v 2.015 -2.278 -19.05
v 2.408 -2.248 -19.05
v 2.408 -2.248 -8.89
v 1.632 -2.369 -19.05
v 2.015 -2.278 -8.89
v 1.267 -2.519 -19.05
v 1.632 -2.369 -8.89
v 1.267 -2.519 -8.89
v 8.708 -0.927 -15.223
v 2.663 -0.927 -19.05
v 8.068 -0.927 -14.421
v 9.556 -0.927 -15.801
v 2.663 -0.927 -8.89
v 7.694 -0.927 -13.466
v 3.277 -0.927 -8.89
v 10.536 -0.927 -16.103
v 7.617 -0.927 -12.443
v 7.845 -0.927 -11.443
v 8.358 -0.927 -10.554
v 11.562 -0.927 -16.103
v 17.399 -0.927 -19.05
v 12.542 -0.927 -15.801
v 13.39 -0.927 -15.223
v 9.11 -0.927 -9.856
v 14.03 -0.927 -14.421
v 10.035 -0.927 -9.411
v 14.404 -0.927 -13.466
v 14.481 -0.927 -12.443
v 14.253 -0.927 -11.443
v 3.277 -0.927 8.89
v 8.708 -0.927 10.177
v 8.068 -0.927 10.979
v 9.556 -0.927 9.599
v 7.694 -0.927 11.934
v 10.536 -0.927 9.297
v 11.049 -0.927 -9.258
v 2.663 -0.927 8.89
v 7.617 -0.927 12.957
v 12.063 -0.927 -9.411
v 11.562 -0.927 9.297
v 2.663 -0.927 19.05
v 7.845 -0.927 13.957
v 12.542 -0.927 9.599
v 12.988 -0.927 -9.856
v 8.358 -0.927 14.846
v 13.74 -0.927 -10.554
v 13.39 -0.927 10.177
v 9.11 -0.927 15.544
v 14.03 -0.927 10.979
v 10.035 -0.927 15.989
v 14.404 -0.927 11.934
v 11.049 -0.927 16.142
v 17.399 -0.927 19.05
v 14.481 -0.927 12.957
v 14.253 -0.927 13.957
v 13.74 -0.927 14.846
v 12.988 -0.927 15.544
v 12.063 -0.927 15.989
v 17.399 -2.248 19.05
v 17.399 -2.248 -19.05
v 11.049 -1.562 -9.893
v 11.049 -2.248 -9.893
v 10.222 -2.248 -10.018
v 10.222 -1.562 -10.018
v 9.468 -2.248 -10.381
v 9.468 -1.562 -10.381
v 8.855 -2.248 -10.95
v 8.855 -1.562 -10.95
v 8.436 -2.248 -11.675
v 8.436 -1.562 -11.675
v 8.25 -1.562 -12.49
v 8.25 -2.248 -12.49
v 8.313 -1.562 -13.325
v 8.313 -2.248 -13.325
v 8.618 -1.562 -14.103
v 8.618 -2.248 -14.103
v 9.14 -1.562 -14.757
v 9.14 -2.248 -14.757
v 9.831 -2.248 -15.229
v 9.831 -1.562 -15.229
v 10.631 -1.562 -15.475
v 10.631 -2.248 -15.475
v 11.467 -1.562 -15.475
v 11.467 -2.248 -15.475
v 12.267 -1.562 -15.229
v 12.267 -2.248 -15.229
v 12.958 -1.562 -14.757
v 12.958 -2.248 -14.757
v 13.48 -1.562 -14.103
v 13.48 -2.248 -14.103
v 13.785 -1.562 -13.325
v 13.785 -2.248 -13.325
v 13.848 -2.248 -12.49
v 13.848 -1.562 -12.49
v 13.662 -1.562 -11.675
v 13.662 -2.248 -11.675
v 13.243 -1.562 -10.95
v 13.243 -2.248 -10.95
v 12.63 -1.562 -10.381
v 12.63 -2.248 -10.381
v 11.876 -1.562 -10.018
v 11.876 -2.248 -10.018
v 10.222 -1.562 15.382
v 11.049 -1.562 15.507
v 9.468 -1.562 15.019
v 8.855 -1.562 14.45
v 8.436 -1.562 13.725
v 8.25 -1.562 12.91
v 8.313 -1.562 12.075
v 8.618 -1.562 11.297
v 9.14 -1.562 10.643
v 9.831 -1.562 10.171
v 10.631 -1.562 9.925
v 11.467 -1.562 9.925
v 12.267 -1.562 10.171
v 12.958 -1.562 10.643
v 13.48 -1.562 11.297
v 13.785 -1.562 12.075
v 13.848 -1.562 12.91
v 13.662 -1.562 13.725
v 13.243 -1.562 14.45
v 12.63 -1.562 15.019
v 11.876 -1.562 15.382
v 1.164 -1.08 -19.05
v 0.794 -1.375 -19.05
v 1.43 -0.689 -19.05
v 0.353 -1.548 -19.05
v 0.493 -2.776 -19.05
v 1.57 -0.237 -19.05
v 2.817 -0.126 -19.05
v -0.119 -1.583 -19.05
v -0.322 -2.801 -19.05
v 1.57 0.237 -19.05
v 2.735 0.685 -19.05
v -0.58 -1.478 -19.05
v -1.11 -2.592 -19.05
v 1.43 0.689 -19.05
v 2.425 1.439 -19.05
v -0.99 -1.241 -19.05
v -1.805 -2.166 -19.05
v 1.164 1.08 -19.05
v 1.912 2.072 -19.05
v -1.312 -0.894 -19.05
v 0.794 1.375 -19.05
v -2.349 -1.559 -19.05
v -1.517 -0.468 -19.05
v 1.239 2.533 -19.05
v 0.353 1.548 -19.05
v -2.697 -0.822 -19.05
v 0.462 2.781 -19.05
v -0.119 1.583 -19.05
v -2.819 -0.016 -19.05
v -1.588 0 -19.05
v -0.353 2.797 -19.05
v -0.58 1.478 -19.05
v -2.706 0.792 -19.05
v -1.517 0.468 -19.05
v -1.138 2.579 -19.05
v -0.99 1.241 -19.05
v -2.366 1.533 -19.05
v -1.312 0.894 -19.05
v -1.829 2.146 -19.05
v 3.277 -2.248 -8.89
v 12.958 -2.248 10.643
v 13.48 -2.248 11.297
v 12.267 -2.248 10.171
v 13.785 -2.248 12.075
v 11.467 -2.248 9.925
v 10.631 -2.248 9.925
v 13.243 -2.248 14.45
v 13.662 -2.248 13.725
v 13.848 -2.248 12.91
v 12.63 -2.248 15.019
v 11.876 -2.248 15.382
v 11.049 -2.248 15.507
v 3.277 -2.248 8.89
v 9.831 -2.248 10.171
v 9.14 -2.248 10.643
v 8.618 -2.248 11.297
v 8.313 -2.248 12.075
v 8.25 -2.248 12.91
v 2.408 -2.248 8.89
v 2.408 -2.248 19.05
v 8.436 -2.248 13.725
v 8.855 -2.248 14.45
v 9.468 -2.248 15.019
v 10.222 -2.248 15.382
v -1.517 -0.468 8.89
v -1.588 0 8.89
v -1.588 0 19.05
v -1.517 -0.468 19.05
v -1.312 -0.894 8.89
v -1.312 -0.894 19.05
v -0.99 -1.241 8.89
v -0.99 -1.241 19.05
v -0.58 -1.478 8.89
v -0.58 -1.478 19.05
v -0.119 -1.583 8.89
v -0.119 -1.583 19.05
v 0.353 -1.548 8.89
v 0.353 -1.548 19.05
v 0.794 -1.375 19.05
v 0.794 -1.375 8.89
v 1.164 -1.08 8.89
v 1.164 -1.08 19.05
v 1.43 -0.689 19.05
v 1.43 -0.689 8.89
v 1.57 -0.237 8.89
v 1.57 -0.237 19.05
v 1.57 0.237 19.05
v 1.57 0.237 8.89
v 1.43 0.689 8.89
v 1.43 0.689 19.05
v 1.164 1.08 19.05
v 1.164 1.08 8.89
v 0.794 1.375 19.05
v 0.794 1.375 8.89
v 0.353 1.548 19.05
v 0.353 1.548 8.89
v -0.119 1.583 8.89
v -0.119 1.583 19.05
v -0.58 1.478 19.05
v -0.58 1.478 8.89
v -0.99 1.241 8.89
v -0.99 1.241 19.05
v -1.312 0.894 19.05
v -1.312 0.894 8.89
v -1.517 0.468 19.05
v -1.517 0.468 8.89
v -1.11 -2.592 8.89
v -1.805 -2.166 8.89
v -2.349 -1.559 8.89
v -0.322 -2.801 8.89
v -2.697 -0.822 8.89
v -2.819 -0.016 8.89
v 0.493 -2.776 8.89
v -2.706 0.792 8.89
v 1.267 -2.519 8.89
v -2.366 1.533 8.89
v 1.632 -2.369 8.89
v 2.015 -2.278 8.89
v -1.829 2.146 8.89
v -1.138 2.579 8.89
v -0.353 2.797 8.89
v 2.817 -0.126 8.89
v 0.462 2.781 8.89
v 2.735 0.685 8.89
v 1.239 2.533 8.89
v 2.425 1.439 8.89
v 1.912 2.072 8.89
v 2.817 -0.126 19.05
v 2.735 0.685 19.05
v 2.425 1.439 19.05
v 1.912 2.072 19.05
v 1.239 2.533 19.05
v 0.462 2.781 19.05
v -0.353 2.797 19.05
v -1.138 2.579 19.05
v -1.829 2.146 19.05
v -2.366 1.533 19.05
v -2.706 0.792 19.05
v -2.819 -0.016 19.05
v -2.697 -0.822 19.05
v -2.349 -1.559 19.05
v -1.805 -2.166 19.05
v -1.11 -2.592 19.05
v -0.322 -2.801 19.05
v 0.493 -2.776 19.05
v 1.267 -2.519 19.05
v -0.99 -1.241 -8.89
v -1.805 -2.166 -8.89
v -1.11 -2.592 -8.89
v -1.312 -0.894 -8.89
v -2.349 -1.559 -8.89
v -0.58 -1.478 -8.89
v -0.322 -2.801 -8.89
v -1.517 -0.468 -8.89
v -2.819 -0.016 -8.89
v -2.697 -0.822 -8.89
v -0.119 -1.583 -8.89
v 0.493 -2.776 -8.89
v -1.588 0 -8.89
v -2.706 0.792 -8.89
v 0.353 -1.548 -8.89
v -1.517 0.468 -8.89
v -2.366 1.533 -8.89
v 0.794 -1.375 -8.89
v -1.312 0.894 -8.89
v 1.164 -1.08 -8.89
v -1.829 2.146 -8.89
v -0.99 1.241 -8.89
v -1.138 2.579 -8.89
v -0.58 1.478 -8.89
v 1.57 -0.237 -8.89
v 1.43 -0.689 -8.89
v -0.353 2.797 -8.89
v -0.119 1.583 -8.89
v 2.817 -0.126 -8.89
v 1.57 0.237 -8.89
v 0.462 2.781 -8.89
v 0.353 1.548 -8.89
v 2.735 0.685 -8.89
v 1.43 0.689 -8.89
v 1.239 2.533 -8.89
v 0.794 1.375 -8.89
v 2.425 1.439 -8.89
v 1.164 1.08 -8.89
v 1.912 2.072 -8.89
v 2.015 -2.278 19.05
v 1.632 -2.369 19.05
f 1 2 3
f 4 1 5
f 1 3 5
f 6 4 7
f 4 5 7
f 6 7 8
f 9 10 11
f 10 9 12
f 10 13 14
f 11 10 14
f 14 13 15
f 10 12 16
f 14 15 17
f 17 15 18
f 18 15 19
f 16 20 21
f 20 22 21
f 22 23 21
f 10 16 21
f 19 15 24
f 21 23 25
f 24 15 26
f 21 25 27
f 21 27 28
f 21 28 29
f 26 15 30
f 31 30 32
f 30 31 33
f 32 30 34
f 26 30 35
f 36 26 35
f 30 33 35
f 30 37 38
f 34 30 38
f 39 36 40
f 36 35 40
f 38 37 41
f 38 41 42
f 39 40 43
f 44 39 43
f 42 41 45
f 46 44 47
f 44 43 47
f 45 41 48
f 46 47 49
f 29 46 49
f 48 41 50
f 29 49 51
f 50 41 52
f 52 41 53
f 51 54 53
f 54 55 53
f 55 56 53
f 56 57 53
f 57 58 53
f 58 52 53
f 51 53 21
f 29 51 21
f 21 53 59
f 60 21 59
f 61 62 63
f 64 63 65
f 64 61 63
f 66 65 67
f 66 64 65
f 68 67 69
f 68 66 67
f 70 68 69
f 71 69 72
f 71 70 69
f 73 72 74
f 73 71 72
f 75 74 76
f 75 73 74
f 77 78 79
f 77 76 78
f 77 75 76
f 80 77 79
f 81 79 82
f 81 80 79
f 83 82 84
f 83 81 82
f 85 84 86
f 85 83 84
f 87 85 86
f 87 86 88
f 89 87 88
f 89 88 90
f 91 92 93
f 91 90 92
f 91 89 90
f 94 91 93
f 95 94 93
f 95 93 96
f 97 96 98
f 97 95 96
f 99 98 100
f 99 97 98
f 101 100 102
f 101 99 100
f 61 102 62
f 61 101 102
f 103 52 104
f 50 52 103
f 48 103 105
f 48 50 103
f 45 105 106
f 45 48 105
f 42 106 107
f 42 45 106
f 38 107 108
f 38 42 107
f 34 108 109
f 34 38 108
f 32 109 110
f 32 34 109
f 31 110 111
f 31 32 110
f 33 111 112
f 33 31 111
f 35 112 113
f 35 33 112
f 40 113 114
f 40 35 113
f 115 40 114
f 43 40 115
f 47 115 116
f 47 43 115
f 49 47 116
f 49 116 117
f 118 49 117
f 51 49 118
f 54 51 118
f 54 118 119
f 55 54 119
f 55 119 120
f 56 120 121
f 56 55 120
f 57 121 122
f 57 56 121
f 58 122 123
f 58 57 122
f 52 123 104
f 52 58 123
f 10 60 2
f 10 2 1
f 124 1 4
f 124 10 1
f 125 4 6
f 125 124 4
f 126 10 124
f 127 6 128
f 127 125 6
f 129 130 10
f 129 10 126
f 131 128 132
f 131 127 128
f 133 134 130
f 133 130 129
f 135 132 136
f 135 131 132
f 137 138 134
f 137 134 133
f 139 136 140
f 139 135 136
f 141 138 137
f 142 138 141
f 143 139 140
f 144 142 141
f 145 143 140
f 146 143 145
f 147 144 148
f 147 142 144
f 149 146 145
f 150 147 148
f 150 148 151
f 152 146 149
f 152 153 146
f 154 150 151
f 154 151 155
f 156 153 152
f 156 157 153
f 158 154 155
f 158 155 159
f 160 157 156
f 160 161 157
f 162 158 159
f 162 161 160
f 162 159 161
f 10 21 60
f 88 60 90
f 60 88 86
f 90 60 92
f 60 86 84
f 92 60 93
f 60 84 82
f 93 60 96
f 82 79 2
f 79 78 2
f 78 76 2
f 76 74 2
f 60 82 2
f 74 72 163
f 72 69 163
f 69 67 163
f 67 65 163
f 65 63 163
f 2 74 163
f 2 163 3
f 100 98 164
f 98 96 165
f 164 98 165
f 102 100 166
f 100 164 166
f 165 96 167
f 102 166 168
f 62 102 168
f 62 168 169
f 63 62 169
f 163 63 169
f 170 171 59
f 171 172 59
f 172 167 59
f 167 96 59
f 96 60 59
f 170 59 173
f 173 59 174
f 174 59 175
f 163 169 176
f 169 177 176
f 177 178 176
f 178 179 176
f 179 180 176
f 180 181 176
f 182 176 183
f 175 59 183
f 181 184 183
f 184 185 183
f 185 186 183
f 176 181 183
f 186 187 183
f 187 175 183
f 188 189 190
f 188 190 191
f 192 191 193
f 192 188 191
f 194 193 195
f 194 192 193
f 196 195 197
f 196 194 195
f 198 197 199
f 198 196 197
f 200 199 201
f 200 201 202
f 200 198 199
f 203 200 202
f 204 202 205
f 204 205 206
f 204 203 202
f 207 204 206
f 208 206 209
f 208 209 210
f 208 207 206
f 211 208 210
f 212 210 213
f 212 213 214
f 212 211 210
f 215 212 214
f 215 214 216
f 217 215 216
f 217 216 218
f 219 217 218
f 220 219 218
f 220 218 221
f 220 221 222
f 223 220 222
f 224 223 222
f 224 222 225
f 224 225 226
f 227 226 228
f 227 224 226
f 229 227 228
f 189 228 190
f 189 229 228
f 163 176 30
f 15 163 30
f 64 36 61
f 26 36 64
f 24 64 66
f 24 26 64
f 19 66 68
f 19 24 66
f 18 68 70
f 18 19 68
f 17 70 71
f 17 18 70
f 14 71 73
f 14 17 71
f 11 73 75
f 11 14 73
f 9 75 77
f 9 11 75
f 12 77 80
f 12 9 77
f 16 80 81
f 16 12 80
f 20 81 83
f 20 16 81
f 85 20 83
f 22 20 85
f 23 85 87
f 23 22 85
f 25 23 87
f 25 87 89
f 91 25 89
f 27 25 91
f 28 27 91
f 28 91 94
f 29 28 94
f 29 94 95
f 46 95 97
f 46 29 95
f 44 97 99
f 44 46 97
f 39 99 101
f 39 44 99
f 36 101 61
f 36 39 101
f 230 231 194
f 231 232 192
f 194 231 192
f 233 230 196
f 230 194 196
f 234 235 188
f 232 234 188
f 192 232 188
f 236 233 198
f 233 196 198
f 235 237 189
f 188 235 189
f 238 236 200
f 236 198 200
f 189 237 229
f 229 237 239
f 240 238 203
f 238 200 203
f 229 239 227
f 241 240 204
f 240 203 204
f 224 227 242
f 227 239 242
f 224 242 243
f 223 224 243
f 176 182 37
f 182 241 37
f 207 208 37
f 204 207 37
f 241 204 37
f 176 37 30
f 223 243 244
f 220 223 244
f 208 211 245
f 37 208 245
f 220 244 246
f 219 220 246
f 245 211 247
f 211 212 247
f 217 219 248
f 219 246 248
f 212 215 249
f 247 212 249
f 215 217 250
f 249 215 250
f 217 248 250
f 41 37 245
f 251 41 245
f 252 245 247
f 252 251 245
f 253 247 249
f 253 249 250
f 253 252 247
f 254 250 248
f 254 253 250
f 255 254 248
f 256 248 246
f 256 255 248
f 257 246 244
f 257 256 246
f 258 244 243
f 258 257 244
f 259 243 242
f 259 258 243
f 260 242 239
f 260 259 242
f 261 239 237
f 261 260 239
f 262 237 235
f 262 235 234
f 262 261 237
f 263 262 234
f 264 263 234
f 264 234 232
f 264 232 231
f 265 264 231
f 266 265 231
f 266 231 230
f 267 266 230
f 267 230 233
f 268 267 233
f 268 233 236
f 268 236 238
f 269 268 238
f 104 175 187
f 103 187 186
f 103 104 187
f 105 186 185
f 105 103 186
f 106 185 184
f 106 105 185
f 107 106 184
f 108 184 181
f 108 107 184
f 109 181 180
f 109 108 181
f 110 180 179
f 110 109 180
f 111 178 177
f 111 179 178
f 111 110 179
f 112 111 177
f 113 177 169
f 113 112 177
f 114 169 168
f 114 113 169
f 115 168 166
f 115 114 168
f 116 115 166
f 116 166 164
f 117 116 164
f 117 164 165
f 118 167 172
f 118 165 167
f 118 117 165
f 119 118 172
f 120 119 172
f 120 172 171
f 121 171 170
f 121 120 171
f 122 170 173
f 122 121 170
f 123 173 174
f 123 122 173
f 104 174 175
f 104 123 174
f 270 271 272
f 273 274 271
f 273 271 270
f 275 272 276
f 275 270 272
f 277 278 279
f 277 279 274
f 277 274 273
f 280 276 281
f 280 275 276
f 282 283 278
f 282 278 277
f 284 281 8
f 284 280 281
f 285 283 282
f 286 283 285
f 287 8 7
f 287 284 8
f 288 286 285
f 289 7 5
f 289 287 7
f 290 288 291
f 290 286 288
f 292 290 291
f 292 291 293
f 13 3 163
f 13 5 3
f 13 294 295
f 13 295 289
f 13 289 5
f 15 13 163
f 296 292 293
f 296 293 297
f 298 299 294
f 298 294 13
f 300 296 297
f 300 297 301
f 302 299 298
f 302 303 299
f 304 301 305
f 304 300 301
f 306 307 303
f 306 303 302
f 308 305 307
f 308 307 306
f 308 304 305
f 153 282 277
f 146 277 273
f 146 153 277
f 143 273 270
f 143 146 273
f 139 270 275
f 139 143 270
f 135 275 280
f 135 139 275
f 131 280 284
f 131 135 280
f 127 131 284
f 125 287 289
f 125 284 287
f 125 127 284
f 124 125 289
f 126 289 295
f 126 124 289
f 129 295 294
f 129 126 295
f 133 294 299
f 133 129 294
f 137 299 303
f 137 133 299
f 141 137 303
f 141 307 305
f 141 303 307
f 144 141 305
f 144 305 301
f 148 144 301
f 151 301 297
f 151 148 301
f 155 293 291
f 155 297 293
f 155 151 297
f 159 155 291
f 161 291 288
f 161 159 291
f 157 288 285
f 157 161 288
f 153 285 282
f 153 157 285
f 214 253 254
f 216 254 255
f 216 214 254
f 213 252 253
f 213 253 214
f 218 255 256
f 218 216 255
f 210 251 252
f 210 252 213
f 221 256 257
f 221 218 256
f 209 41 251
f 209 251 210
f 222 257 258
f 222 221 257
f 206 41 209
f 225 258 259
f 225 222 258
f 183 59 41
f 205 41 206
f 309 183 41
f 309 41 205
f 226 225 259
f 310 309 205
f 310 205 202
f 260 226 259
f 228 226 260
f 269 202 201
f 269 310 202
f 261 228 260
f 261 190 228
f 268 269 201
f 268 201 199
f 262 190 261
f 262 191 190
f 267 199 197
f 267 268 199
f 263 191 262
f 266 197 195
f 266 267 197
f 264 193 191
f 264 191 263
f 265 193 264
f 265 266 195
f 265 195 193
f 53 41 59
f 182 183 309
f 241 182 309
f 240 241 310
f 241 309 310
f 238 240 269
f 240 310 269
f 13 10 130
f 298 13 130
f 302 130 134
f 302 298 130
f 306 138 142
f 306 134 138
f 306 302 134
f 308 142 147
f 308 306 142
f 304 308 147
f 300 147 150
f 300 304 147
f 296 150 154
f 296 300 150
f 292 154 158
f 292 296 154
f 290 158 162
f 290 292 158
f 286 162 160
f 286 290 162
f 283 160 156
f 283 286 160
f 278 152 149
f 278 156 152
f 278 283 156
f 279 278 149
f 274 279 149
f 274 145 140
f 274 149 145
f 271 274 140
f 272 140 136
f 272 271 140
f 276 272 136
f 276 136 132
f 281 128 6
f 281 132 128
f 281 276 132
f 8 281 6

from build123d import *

# Parameters (mm, degrees)
SKETCH2_R                       = 2.8194
SKETCH2_R_2                     = 1.5875
BOSS_EXTRUDE1_DEPTH             = 19.05
BOSS_EXTRUDE2_REACH             = 21.463
BOSS_EXTRUDE2_DIRECTION_2_REACH = 21.463
FILLET1_R                       = 2.54
SKETCH4_W                       = 6.5532
SKETCH4_H                       = 6.5532
CUT_EXTRUDE1_DEPTH              = 8.89
F_10_CLEARANCE_HOLE1_AT_2_COUNT = 2
F_10_CLEARANCE_HOLE1_AT_2_PITCH = 25.4


with BuildPart() as part:
    # Sketch2 → Boss-Extrude1 (new, symmetric)
    with BuildSketch(Plane.XY):
        with Locations(Location((0, 0, 0), (0, 0, 180))):
            Circle(SKETCH2_R)
        with Locations(Location((0, 0, 0), (0, 0, 180))):
            Circle(SKETCH2_R_2, mode=Mode.SUBTRACT)
    extrude(amount=BOSS_EXTRUDE1_DEPTH, both=True)

    # Boss-Extrude2: up to this face of the body (flat: up to its plane)
    boss_extrude2_end = Plane(part.part.faces().sort_by_distance((2.739655326, 0, 19.05))[0])
    # Sketch3 → Boss-Extrude2 (add, up to the picked face)
    with BuildSketch(Plane.XY, mode=Mode.PRIVATE) as boss_extrude2_sk1:
        with BuildLine():
            Line((2.662611866, -0.9271), (17.399, -0.9271))
            Line((17.399, -0.9271), (17.399, -2.2479))
            Line((17.399, -2.2479), (1.701752611, -2.2479))
            ThreePointArc((1.701752611, -2.2479), (2.279922692, -1.658604497), (2.662611866, -0.9271))
        make_face()
    boss_extrude2_tool1 = split(extrude(boss_extrude2_sk1.sketch, amount=BOSS_EXTRUDE2_REACH, mode=Mode.PRIVATE), bisect_by=boss_extrude2_end, keep=Keep.BOTH, mode=Mode.PRIVATE)
    add(boss_extrude2_tool1.solids().sort_by(Axis((9.838158, -1.594307, 0), (0, 0, 1)))[0])

    # Boss-Extrude2 direction 2: up to this face of the body (flat: up to its plane)
    boss_extrude2_direction_2_end = Plane(part.part.faces().sort_by_distance((2.739655326, 0, -19.05))[0])
    # Sketch3 → Boss-Extrude2 direction 2 (add, up to the picked face)
    with BuildSketch(Plane.XY, mode=Mode.PRIVATE) as boss_extrude2_direction_2_sk1:
        with BuildLine():
            Line((2.662611866, -0.9271), (17.399, -0.9271))
            Line((17.399, -0.9271), (17.399, -2.2479))
            Line((17.399, -2.2479), (1.701752611, -2.2479))
            ThreePointArc((1.701752611, -2.2479), (2.279922692, -1.658604497), (2.662611866, -0.9271))
        make_face()
    boss_extrude2_direction_2_tool1 = split(extrude(boss_extrude2_direction_2_sk1.sketch, amount=-BOSS_EXTRUDE2_DIRECTION_2_REACH, mode=Mode.PRIVATE), bisect_by=boss_extrude2_direction_2_end, keep=Keep.BOTH, mode=Mode.PRIVATE)
    add(boss_extrude2_direction_2_tool1.solids().sort_by(Axis((9.838158, -1.594307, 0), (0, 0, -1)))[0])

    # Fillet1
    fillet1_edges = [part.edges().sort_by_distance(p)[0] for p in [
        (1.701752611, -2.2479, 0),
    ]]
    fillet(fillet1_edges, radius=FILLET1_R)

    # Sketch4 → Cut-Extrude1 (cut, symmetric)
    with BuildSketch(Plane.XY):
        Rectangle(SKETCH4_W, SKETCH4_H)
    extrude(amount=CUT_EXTRUDE1_DEPTH, both=True, mode=Mode.SUBTRACT)

    # Sketch6 → #10 Clearance Hole1 (revolve, cut)
    with BuildSketch(Plane(origin=(11.049, -0.9271, -12.7), x_dir=(0, 0, 1), z_dir=(1, 0, 0))):
        Polygon((0, 0), (0, 1.8923), (2.8067, 1.8923), (2.8067, 0.635), (3.4417, 0), align=None)
    f_10_clearance_hole1 = revolve(axis=Axis((11.049, 5.4229, -12.7), (0, -1, 0)), mode=Mode.SUBTRACT)

    # #10 Clearance Hole1 at 2: #10 Clearance Hole1 ×2
    with Locations(*[(0, 0, i * F_10_CLEARANCE_HOLE1_AT_2_PITCH) for i in range(1, F_10_CLEARANCE_HOLE1_AT_2_COUNT)]):
        add(f_10_clearance_hole1, mode=Mode.SUBTRACT)


solid = part.part
